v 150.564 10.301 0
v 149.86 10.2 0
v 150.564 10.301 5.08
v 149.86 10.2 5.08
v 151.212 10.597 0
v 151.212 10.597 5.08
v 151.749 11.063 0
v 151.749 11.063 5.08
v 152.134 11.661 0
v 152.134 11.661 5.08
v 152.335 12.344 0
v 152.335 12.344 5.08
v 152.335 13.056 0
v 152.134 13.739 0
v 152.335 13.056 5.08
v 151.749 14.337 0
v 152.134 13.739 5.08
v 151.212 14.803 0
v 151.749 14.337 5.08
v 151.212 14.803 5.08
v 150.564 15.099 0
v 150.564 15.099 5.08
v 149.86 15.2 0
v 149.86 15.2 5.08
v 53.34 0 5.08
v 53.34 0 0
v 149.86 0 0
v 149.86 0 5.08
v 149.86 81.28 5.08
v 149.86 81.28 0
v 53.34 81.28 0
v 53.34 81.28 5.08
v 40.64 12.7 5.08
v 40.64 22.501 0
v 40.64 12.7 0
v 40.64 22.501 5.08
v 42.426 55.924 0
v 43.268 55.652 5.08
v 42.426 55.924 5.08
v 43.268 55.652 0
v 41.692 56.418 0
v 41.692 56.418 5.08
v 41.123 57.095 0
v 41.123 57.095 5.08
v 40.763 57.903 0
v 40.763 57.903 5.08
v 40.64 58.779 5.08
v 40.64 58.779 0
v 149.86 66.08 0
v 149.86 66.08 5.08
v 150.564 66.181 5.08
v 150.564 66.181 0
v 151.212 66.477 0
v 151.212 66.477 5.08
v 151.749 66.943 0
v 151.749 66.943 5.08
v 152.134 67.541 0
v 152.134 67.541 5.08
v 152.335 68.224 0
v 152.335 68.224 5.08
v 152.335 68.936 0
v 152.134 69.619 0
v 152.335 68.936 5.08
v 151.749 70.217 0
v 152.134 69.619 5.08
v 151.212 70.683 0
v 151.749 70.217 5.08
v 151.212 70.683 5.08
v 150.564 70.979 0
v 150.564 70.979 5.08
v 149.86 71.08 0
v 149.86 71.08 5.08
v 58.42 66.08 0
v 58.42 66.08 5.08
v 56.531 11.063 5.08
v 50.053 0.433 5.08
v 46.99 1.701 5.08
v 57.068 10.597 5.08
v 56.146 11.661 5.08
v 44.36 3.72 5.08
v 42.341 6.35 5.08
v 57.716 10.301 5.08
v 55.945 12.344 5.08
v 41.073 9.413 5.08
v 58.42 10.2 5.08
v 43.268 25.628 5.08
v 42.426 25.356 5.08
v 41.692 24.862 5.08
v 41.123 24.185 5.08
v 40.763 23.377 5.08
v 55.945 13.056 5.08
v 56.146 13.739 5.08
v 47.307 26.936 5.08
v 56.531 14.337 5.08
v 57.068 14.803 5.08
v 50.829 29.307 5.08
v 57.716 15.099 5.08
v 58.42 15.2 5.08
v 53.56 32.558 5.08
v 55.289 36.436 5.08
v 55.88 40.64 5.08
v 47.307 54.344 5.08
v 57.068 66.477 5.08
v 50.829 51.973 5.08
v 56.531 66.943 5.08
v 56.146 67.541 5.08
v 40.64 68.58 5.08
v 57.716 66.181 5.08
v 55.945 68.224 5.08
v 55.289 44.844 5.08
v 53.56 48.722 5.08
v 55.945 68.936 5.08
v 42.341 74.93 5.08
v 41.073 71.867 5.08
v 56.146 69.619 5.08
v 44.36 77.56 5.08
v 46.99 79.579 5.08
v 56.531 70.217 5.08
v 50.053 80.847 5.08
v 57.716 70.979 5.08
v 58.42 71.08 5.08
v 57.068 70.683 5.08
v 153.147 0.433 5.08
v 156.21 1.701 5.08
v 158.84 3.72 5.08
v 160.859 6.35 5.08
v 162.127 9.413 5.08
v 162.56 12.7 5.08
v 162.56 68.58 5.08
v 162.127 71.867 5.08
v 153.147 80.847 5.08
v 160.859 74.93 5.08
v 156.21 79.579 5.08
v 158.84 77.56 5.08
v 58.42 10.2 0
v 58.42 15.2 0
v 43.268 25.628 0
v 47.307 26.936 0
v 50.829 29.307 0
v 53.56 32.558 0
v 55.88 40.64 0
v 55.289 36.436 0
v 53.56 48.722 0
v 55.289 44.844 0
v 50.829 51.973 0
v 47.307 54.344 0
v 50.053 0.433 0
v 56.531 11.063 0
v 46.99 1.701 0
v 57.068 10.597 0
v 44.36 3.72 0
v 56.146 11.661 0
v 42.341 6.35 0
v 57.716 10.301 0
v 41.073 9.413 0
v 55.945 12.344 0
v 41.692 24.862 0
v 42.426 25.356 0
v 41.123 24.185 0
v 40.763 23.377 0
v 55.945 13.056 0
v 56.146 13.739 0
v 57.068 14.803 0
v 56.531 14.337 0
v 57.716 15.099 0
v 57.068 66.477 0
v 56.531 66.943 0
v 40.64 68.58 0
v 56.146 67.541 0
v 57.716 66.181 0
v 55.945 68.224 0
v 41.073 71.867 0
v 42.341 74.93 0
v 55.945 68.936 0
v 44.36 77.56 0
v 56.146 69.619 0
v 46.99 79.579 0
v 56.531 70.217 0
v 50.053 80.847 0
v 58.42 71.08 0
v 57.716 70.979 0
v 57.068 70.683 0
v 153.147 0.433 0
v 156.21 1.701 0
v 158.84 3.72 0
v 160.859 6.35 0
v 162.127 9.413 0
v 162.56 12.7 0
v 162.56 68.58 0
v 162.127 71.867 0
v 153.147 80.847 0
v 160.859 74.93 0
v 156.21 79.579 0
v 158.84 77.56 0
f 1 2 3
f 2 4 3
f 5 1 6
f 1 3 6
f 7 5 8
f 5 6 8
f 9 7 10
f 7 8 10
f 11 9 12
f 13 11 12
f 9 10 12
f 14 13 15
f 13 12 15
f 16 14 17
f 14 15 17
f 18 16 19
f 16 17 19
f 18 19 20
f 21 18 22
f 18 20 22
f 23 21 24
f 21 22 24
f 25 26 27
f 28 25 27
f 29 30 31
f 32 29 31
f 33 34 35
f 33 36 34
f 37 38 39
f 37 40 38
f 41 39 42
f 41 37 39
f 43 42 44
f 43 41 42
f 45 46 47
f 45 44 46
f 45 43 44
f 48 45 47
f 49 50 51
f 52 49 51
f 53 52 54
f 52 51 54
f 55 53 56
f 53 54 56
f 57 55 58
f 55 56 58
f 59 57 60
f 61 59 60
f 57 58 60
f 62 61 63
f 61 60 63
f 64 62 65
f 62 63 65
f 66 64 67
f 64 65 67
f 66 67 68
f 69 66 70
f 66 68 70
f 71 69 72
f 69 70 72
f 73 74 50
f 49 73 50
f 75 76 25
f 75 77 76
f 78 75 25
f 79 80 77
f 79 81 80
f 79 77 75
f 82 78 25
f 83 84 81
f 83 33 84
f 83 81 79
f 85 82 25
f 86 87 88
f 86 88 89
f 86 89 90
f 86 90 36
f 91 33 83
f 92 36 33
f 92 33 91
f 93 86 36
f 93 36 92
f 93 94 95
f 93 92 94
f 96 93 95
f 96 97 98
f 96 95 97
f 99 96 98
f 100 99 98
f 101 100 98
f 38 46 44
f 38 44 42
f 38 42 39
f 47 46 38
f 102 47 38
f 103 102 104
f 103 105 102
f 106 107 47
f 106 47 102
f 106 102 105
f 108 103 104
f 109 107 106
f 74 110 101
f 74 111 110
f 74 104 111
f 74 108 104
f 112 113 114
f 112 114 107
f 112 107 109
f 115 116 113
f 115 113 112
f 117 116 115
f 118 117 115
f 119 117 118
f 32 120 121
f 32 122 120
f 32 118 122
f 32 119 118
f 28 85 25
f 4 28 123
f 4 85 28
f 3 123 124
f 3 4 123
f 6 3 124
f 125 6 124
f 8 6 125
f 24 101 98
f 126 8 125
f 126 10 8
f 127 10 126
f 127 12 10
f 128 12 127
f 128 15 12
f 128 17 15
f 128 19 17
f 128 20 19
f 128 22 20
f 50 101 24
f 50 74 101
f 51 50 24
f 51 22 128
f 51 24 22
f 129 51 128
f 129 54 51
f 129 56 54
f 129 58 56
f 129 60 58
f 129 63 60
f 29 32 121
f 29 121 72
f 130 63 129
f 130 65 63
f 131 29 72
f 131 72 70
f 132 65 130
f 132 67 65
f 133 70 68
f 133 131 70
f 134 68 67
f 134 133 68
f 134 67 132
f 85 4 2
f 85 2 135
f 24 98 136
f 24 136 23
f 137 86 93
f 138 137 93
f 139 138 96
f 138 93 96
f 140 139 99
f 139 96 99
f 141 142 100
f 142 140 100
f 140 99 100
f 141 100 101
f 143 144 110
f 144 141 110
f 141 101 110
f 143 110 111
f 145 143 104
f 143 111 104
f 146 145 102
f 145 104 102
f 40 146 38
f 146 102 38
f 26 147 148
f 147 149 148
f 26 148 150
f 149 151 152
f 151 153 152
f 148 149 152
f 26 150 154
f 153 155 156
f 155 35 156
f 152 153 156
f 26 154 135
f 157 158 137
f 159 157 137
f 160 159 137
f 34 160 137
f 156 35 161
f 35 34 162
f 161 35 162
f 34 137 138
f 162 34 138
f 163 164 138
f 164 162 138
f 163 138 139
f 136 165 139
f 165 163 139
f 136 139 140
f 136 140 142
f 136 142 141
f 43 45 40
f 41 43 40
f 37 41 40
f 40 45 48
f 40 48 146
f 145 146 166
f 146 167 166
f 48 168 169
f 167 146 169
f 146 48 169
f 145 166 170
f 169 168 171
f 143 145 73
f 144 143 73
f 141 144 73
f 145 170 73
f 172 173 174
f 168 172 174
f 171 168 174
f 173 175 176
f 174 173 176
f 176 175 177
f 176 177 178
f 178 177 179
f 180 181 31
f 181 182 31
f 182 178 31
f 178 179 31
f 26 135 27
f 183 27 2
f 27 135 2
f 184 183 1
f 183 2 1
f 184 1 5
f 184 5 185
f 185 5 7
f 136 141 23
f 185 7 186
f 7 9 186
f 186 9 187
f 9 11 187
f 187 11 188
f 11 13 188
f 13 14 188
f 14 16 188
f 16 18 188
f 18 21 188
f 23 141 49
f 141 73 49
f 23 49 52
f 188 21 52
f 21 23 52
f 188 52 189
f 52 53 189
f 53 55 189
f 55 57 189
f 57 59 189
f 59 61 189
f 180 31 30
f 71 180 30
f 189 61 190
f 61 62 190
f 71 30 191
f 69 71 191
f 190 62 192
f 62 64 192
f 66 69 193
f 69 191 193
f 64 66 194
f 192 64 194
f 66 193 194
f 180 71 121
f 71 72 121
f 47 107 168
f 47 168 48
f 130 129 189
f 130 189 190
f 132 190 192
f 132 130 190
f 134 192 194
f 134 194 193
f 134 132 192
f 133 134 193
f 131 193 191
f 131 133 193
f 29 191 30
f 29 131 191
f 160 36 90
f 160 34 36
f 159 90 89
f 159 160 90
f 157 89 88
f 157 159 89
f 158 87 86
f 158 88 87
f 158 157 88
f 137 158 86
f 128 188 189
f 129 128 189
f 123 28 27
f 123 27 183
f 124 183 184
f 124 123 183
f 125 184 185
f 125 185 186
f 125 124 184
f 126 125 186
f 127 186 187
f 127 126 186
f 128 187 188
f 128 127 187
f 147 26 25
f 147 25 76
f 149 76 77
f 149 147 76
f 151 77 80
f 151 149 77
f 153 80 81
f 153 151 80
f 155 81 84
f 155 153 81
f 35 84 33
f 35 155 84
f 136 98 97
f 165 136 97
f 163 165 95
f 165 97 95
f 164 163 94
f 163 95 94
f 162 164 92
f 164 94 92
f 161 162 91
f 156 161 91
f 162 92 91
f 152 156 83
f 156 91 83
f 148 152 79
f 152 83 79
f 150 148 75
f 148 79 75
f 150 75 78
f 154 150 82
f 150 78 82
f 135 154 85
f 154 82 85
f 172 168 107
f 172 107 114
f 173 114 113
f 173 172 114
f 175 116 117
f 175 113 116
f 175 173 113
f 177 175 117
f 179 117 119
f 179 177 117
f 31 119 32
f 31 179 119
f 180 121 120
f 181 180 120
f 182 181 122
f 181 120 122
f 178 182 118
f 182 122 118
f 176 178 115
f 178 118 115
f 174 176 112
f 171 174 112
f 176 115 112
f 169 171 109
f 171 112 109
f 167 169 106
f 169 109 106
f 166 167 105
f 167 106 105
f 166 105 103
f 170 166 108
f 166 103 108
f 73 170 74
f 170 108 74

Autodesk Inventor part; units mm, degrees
ref_plane "YZ Plane" through (0, 0, 0) normal (1, 0, 0) x (0, 1, 0)
ref_plane "XZ Plane" through (0, 0, 0) normal (0, 1, 0) x (-1, 0, 0)
ref_plane "XY Plane" through (0, 0, 0) normal (0, 0, 1) x (1, 0, 0)
sketch "Sketch1" plane through (0, 0, 0) normal (0, 0, 1) x (1, 0, 0)
  line L0 (0, 0) -> (162.56, 0)
  line L1 (162.56, 0) -> (162.56, 81.28)
  line L2 (162.56, 81.28) -> (0, 81.28)
  line L3 (0, 81.28) -> (0, 0)
  dimension "d0" = 162.56
  dimension "d1" = 81.28
extrude "Extrusion1" add sketch "Sketch1" along normal blind 5.08
sketch "Sketch2" plane through (0, 0, 5.08) normal (0, 0, 1) x (1, 0, 0)
  line L0 (0, 0) -> (162.56, 0) projected
  line L1 (162.56, 0) -> (162.56, 81.28) projected
  line L2 (162.56, 81.28) -> (0, 81.28) projected
  line L3 (0, 81.28) -> (0, 0) construction
  line L4 (0, 40.64) -> (162.56, 40.64) construction
  arc A0 (40.64, 55.88) -> (40.64, 25.4) centre (40.64, 40.64) ccw construction
  arc A1 (78.3143, 55.88) -> (40.64, 81.28) centre (40.64, 40.64) ccw construction
  line L5 (0, 81.28) -> (0, 0) projected
  line L6 (0, 0) -> (162.56, 0) projected
  line L7 (0, 81.28) -> (40.64, 81.28) construction
  line L8 (162.56, 81.28) -> (162.56, 0)
  line L9 (162.56, 0) -> (40.64, 0)
  line L10 (0, 0) -> (0, 40.64)
  line L11 (0, 40.64) -> (0, 81.28)
  line L12 (40.64, 0) -> (0, 0) construction
  line L13 (40.64, 81.28) -> (162.56, 81.28)
  line L14 (40.64, 25.4) -> (78.3143, 25.4)
  line L15 (40.64, 55.88) -> (78.3143, 55.88)
  line L16 (162.56, 0) -> (162.56, 81.28) projected
  line L17 (162.56, 23.2866) -> (162.56, 55.88)
  line L18 (40.64, 25.4) -> (78.3143, 25.4)
  line L19 (162.56, 25.4) -> (162.56, 55.88) construction
  line L20 (162.56, 55.88) -> (40.64, 55.88)
  line L21 (40.64, 55.88) -> (40.64, 40.64) construction
  arc A2 (55.88, 40.64) -> (40.64, 55.88) centre (40.64, 40.64) ccw
  arc A3 (40.64, 25.4) -> (55.88, 40.64) centre (40.64, 40.64) ccw
  arc A4 (81.28, 40.64) -> (78.3143, 55.88) centre (40.64, 40.64) ccw construction
  arc A5 (78.3143, 25.4) -> (81.28, 40.64) centre (40.64, 40.64) ccw construction
  arc A6 (40.64, 81.28) -> (2.9657, 55.88) centre (40.64, 40.64) ccw construction
  arc A7 (40.64, 0) -> (78.3143, 25.4) centre (40.64, 40.64) ccw construction
  arc A8 (0, 40.64) -> (2.9657, 25.4) centre (40.64, 40.64) ccw
  arc A9 (2.9657, 25.4) -> (40.64, 0) centre (40.64, 40.64) ccw
  arc A10 (2.9657, 55.88) -> (0, 40.64) centre (40.64, 40.64) ccw
  line L22 (78.3143, 55.88) -> (162.56, 55.88)
  line L23 (78.3143, 25.4) -> (162.56, 25.4)
  line L24 (78.3143, 25.4) -> (162.56, 25.4)
  line L25 (40.64, 81.28) -> (40.64, 55.88)
  line L26 (40.64, 40.64) -> (40.64, 25.4) construction
  line L27 (40.64, 55.88) -> (40.64, 40.64) construction
  line L28 (40.64, 25.4) -> (40.64, 0)
  line L29 (40.64, 40.64) -> (40.64, 25.4)
  dimension "d4" = 30.48
extrude "Extrusion2" cut sketch "Sketch2" against normal blind 5.08 contours L28 L14 L23 L1 L0 | A3 A2 L15 L20 L1 L23 L14 | L2 L1 L20 L15 L25 keep common part
sketch "Sketch3" plane through (0, 0, 5.08) normal (0, 0, 1) x (1, 0, 0)
  line L0 (162.56, 0) -> (162.56, 81.28) projected
  line L1 (40.64, 0) -> (162.56, 0) projected
  line L2 (40.64, 40.64) -> (162.56, 40.64) construction
  line L3 (162.56, 40.64) -> (162.56, 25.4) construction
  line L4 (58.42, 68.58) -> (149.86, 68.58) construction
  line L5 (58.42, 66.08) -> (149.86, 66.08)
  line L6 (149.86, 71.08) -> (58.42, 71.08)
  arc A0 (58.42, 71.08) -> (58.42, 66.08) centre (58.42, 68.58) ccw
  arc A1 (149.86, 66.08) -> (149.86, 71.08) centre (149.86, 68.58) ccw
  line L7 (40.64, 55.88) -> (40.64, 81.28) construction
  line L8 (58.42, 12.7) -> (149.86, 12.7) construction
  line L9 (58.42, 15.2) -> (149.86, 15.2)
  line L10 (149.86, 10.2) -> (58.42, 10.2)
  arc A2 (58.42, 15.2) -> (58.42, 10.2) centre (58.42, 12.7) ccw
  arc A3 (149.86, 10.2) -> (149.86, 15.2) centre (149.86, 12.7) ccw
  line L11 (40.64, 0) -> (40.64, 25.4) projected
  line L12 (40.64, 55.88) -> (40.64, 81.28) projected
  arc A4 (40.64, 25.4) -> (40.64, 55.88) centre (40.64, 40.64) ccw projected
  line L13 (162.56, 81.28) -> (40.64, 81.28) projected
  point P0 (0, 0)
  point P1 (104.14, 68.58)
  point P2 (104.14, 12.7)
  dimension "d7" = 2.5
  dimension "d8" = 121.92
  dimension "d12" = 91.44
  dimension "d13" = 12.7
extrude "Extrusion3" cut sketch "Sketch3" against normal blind 5.08 contours A0 L6 A1 L5 | L9 A3 L10 A2
fillet "Fillet1" radius 12.7 2 edges at (162.56, 0, 2.54) (162.56, 81.28, 2.54)
fillet "Fillet2" radius 12.7 2 edges at (40.64, 81.28, 2.54) (40.64, 0, 2.54)
fillet "Fillet3" radius 3.175 2 edges at (40.64, 55.88, 2.54) (40.64, 25.4, 2.54)
equation "\"d0\" = 2 * d1"
equation "\"d13\" = d11"
equation "\"d11\" = 0.5 * d10"
equation "\"d10\" = 25.4"
properties part number "SuctionGrabberB" material "Wood (Birch)"
